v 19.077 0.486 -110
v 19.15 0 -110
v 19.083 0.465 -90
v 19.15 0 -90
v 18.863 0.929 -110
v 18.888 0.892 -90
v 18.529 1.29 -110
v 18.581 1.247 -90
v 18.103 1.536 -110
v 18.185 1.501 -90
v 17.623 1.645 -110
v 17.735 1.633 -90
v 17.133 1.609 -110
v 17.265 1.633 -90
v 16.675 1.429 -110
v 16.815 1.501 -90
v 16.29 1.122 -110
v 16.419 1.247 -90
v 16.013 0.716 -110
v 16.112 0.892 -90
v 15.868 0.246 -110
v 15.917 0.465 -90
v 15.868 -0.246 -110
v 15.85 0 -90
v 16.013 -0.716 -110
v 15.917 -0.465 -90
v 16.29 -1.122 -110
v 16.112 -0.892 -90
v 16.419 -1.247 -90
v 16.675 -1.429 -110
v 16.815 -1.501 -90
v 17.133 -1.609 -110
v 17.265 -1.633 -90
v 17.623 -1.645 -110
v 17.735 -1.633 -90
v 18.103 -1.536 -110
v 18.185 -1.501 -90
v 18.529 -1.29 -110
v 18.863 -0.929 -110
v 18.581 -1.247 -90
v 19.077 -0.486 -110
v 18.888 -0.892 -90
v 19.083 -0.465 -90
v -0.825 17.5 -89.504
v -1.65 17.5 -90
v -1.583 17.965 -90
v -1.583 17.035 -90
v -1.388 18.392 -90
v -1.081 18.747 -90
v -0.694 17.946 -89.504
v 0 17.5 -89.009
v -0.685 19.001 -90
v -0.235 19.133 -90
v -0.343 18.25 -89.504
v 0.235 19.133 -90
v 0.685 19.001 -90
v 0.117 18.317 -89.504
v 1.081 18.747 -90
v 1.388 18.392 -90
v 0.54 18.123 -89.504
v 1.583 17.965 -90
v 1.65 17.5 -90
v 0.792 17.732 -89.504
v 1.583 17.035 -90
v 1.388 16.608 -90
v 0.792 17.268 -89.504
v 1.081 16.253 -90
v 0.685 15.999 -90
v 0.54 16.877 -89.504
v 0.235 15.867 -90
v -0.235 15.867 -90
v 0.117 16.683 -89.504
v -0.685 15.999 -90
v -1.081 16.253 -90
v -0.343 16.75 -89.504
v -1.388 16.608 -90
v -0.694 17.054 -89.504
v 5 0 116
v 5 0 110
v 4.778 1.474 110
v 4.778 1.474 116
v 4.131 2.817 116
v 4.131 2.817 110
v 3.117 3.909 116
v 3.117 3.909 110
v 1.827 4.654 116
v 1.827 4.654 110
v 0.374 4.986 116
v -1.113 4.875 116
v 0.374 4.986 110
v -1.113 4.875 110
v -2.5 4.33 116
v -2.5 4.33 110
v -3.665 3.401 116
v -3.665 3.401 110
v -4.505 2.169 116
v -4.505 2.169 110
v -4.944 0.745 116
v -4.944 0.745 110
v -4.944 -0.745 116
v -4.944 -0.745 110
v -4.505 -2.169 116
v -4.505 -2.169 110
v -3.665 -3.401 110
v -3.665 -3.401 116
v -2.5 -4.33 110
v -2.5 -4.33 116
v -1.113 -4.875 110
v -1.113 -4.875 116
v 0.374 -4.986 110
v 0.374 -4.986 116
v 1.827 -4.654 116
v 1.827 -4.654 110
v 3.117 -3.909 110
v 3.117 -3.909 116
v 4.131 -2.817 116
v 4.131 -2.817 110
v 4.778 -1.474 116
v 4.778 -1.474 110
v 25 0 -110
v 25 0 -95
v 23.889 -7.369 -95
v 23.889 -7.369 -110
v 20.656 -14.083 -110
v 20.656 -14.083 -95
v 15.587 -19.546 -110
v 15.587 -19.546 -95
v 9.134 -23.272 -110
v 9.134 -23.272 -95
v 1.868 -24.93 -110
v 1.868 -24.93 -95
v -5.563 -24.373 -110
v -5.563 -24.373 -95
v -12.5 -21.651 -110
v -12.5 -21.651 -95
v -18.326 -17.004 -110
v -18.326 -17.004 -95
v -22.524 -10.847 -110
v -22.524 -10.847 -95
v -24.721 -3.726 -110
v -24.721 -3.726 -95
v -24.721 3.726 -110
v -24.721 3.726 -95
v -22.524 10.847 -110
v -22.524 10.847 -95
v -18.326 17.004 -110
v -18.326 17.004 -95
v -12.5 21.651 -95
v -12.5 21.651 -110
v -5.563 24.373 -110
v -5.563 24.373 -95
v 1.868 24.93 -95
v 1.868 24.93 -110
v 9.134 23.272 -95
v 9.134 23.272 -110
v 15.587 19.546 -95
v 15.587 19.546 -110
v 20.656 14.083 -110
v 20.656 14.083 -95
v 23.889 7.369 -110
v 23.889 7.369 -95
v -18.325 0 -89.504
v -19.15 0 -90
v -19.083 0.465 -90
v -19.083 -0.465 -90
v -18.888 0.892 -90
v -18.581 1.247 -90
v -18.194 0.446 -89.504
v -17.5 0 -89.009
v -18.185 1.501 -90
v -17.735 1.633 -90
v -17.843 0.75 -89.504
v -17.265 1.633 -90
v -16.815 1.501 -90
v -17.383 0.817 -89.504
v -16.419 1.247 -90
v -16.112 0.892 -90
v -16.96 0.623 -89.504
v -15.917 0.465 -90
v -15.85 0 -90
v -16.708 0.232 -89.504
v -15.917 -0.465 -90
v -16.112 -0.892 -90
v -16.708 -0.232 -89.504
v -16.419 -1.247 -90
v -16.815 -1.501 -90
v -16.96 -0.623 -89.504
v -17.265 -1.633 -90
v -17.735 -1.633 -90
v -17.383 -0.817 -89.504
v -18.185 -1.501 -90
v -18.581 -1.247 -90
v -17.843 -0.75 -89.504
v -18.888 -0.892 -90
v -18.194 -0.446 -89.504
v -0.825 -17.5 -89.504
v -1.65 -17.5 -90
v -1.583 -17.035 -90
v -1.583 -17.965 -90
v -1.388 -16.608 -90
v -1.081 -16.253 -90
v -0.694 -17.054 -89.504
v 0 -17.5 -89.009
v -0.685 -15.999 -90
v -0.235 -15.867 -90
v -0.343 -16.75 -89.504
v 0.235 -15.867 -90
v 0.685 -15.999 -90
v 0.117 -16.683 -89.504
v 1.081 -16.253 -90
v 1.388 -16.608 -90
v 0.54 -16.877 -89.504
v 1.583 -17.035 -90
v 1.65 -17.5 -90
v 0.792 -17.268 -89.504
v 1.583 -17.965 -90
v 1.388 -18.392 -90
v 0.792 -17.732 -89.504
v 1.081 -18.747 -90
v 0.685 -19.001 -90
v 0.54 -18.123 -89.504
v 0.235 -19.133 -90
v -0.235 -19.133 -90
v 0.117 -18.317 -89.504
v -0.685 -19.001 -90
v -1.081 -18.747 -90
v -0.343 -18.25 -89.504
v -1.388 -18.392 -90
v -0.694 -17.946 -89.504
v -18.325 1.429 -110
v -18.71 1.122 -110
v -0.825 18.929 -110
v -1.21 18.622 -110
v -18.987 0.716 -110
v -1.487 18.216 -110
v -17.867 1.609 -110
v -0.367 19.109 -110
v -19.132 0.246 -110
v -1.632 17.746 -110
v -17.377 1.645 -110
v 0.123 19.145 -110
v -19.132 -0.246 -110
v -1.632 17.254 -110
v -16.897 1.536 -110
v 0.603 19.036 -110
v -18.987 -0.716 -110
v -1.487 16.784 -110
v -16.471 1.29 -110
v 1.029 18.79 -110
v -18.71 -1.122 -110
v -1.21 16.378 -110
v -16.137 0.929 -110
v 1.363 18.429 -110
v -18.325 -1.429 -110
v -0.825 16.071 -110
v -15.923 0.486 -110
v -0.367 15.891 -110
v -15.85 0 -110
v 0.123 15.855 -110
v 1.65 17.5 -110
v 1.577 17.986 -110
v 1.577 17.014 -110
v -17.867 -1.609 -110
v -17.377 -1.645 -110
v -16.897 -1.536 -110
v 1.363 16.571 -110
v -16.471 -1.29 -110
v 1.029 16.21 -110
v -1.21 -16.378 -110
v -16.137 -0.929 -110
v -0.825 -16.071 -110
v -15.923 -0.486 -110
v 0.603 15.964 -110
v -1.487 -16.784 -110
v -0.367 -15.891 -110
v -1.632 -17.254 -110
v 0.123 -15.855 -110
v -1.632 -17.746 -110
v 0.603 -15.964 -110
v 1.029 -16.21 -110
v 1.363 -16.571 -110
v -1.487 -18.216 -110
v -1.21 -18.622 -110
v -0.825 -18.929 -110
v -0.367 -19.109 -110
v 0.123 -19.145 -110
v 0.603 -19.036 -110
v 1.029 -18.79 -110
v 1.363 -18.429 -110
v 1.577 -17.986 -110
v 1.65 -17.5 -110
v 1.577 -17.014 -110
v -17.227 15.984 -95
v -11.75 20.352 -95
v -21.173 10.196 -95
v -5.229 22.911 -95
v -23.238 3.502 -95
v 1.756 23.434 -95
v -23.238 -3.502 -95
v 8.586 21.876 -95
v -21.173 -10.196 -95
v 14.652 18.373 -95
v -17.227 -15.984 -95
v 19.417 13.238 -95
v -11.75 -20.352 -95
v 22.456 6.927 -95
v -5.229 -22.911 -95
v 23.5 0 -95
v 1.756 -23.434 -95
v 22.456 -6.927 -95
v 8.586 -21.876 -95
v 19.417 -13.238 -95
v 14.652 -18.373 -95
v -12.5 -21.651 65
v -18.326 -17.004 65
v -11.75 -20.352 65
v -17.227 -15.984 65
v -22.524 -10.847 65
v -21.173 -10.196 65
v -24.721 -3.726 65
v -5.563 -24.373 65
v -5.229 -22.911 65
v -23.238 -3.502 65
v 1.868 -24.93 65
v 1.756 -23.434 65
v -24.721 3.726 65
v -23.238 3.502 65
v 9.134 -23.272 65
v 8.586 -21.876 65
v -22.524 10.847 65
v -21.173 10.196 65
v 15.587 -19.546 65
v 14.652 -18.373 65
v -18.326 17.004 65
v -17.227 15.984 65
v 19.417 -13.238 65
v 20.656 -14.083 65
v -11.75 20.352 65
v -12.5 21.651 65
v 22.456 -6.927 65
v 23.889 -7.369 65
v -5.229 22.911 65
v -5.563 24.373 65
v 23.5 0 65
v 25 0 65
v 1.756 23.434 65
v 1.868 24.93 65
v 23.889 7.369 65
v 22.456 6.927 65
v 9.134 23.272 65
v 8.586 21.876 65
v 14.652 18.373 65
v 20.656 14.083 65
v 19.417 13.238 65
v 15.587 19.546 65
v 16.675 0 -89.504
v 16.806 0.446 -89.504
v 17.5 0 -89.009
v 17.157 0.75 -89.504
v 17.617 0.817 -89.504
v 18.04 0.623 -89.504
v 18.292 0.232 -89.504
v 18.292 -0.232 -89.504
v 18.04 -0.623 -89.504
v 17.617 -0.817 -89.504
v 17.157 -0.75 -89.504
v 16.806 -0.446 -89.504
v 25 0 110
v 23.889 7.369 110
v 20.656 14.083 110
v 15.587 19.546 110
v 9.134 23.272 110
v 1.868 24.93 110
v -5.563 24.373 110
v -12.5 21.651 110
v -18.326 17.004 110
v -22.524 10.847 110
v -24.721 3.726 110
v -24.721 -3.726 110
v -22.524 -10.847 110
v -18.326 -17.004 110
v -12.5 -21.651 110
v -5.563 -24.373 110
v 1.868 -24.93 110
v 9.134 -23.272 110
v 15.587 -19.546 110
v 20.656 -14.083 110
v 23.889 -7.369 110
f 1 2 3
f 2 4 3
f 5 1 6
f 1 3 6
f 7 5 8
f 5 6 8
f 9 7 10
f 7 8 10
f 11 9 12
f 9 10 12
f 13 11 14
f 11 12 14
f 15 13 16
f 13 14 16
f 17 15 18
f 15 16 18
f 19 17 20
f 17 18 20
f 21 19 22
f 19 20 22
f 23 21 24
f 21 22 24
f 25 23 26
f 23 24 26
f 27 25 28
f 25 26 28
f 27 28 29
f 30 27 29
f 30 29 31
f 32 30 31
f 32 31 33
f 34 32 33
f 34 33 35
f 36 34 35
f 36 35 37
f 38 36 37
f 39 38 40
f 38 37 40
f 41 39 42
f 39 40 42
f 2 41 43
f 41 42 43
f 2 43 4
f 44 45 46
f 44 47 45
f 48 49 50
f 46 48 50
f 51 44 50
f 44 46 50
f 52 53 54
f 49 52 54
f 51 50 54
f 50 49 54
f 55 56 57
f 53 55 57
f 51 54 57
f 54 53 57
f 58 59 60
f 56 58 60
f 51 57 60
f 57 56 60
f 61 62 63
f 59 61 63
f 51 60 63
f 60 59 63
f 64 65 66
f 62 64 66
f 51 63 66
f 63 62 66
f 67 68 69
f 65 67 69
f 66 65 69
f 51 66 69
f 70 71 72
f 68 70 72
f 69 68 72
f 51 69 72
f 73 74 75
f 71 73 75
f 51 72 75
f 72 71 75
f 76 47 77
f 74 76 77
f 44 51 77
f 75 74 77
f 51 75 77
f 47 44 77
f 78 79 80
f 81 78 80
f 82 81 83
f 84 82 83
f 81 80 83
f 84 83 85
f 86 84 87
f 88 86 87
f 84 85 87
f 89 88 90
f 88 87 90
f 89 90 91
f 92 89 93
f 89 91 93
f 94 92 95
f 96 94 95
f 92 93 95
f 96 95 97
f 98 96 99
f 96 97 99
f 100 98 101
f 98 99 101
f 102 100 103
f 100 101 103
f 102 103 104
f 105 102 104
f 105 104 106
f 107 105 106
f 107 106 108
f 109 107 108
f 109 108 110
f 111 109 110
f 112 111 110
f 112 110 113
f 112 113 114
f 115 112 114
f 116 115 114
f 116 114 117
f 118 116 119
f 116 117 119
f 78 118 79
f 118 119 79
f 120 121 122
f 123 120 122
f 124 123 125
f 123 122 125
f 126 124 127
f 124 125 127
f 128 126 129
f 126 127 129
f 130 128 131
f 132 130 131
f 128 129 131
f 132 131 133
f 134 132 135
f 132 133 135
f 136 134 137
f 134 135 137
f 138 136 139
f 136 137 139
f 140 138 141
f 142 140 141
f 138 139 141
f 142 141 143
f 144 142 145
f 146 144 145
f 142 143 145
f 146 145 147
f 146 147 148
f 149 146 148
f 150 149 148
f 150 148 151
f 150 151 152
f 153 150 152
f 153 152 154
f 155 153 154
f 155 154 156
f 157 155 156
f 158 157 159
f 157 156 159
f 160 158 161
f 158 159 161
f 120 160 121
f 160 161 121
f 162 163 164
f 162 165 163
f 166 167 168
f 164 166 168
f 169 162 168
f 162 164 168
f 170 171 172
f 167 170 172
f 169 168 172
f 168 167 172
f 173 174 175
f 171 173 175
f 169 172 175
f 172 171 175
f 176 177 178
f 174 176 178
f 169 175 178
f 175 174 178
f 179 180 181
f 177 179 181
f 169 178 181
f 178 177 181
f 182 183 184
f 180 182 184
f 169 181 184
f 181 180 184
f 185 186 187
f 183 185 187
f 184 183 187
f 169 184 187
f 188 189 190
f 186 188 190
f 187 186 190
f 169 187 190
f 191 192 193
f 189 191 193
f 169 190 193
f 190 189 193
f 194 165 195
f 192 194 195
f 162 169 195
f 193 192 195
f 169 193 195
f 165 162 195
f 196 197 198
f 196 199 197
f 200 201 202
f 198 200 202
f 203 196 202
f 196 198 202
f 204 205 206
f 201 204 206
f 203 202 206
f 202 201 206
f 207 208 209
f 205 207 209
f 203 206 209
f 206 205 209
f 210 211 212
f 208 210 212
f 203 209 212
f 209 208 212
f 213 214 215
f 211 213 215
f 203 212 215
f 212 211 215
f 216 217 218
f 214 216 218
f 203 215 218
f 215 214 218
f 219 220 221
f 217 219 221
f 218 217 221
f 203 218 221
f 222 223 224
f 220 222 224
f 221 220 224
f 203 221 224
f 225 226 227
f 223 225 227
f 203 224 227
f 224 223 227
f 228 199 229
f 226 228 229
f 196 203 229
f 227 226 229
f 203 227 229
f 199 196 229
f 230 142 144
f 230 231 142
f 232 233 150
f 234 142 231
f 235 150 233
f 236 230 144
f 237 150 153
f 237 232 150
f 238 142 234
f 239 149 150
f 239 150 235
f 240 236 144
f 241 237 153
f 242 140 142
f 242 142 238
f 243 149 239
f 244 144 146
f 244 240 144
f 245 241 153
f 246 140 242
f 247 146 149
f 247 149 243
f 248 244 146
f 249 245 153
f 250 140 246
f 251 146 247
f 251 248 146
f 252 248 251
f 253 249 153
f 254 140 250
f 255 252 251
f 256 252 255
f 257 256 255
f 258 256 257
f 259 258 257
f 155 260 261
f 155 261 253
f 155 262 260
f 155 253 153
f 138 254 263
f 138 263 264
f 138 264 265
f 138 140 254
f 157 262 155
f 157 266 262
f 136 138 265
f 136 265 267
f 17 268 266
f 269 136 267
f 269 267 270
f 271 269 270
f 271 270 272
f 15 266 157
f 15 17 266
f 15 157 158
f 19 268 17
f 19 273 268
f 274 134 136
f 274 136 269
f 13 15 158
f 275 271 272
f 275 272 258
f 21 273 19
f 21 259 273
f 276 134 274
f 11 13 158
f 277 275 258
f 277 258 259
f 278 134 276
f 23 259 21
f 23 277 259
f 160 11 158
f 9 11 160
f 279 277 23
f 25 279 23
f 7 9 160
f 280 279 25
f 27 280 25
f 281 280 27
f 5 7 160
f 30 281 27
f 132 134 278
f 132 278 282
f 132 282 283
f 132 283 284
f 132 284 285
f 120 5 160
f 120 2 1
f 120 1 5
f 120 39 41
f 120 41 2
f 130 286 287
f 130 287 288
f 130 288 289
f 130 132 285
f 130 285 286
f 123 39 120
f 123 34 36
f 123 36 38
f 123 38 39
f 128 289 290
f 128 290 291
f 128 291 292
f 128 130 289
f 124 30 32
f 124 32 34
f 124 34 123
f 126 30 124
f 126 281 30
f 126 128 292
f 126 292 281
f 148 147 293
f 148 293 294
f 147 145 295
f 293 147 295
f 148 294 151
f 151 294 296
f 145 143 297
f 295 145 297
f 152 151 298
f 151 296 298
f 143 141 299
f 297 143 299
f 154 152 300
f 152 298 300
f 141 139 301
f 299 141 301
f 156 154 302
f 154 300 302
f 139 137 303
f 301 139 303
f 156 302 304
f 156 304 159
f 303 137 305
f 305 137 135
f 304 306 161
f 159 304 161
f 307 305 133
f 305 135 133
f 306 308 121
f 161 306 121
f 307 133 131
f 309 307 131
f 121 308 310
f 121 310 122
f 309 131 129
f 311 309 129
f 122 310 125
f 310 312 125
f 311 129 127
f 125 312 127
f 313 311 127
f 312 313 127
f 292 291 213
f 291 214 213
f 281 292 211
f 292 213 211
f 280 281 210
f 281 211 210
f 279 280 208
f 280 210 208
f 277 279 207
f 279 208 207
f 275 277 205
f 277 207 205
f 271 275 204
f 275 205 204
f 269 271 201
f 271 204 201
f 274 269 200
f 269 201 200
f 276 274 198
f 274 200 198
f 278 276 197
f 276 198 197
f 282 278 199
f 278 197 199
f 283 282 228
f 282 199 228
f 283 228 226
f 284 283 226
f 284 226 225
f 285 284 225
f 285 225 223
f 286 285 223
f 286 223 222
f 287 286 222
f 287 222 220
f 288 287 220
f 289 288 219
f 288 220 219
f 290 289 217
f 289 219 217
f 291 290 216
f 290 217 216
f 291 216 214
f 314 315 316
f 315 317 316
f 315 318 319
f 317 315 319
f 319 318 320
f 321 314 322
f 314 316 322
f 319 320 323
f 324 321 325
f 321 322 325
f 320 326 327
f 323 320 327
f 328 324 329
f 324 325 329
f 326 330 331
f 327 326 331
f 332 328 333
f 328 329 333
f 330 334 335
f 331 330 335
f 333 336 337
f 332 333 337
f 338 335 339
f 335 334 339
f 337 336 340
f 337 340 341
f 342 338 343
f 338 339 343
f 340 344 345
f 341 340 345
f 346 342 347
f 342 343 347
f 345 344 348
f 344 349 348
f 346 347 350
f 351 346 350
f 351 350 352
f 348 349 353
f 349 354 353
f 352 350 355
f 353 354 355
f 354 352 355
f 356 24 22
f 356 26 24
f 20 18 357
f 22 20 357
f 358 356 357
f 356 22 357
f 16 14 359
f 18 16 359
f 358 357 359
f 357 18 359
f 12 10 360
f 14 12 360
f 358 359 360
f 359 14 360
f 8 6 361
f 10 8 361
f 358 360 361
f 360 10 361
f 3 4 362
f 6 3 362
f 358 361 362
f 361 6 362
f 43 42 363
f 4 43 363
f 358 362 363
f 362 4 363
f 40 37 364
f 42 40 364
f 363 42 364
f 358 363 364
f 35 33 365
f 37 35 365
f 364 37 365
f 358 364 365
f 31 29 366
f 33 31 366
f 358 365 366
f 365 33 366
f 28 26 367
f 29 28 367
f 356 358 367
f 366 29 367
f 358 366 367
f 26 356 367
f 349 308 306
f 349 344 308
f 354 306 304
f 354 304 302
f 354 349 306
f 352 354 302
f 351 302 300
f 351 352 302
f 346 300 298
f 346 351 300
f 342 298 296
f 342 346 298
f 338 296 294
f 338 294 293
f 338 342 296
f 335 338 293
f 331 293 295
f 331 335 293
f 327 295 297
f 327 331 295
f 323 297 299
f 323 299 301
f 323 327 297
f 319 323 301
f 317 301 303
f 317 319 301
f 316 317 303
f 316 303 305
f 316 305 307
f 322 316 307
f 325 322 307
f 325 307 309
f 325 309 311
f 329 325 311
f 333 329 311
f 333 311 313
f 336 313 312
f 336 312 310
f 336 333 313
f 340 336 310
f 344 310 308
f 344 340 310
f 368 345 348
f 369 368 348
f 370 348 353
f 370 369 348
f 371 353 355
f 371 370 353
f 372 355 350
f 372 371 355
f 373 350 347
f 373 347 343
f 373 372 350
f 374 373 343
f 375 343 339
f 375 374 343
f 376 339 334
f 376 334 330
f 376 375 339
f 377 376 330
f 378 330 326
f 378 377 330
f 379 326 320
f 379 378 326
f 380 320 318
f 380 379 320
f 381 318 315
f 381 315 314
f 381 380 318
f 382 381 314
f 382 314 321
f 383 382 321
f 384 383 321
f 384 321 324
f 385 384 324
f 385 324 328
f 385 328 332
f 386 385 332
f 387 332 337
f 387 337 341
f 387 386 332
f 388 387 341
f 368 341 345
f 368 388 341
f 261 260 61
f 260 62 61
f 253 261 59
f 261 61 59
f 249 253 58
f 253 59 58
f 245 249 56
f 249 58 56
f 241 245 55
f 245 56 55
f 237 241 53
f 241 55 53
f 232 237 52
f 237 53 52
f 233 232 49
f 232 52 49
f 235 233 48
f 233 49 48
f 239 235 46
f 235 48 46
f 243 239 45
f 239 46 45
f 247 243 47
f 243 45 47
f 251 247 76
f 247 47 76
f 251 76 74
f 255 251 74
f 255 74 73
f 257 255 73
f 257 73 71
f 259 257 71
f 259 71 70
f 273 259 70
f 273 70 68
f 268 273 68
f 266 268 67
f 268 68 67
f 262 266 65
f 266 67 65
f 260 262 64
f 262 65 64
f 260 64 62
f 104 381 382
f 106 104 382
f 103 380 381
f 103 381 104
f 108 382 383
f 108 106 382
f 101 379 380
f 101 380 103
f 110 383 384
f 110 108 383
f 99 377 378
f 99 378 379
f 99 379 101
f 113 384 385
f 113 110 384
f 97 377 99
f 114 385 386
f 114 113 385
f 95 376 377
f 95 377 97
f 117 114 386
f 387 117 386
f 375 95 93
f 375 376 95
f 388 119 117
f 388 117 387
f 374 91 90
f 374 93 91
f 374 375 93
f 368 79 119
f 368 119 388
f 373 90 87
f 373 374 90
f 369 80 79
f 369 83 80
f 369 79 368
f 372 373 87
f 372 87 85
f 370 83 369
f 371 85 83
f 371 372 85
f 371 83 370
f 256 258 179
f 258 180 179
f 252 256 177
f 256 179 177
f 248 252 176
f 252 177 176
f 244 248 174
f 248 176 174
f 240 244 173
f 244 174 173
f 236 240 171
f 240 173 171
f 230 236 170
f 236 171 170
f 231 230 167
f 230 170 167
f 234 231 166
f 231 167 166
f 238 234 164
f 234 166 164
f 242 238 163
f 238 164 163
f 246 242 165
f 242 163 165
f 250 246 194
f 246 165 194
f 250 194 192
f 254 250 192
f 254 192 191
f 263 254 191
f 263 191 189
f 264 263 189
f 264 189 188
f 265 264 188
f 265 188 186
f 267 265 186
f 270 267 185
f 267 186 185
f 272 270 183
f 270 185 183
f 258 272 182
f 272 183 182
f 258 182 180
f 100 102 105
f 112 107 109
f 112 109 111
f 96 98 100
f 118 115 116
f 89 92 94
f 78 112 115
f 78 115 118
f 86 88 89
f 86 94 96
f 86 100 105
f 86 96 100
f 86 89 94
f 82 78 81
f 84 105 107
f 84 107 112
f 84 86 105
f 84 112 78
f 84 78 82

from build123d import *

# Parameters (mm, degrees)
SKETCH1_R                 = 23.5
BOSS_EXTRUDE1_DEPTH       = 110
SKETCH2_R                 = 5
BOSS_EXTRUDE2_DEPTH       = 6
SKETCH5_R                 = 25
BOSS_EXTRUDE5_DEPTH       = 45
BOSS_EXTRUDE6_START       = -15
SKETCH6_R                 = 25
BOSS_EXTRUDE6_DEPTH       = 15
M4X0_7_TAPPED_HOLE1_D     = 3.3
M4X0_7_TAPPED_HOLE1_DEPTH = 20
M4X0_7_TAPPED_HOLE1_TIP   = 0.991420021


with BuildPart() as part:
    # Sketch1 → Boss-Extrude1 (new, symmetric)
    with BuildSketch(Plane.XY):
        Circle(SKETCH1_R)
    extrude(amount=BOSS_EXTRUDE1_DEPTH, both=True)

    # Sketch2 → Boss-Extrude2 (add)
    with BuildSketch(Plane.XY.offset(110)):
        Circle(SKETCH2_R)
    extrude(amount=BOSS_EXTRUDE2_DEPTH)

    # Sketch5 → Boss-Extrude5 (add)
    with BuildSketch(Plane.XY.offset(110)):
        Circle(SKETCH5_R)
    extrude(amount=-BOSS_EXTRUDE5_DEPTH)

    # Sketch6 → Boss-Extrude6 (add)
    with BuildSketch(Plane(origin=(0, 0, -110), x_dir=(-1, 0, 0), z_dir=(0, 0, -1)).offset(BOSS_EXTRUDE6_START)):
        with Locations(Location((0, 0, 0), (0, 0, 180))):
            Circle(SKETCH6_R)
    extrude(amount=BOSS_EXTRUDE6_DEPTH)

    # M4x0.7 Tapped Hole1
    with Locations(Plane(origin=(0, 17.5, -110), x_dir=(-1, 0, 0), z_dir=(0, 0, -1))):
        with Locations((0, 0), (17.5, -17.5), (0, -35), (-17.5, -17.5)):
            Hole(M4X0_7_TAPPED_HOLE1_D / 2, depth=M4X0_7_TAPPED_HOLE1_DEPTH)
            with Locations((0, 0, -(M4X0_7_TAPPED_HOLE1_DEPTH + M4X0_7_TAPPED_HOLE1_TIP / 2))):  # 118° drill point
                Cone(0, M4X0_7_TAPPED_HOLE1_D / 2, M4X0_7_TAPPED_HOLE1_TIP, mode=Mode.SUBTRACT)


solid = part.part
